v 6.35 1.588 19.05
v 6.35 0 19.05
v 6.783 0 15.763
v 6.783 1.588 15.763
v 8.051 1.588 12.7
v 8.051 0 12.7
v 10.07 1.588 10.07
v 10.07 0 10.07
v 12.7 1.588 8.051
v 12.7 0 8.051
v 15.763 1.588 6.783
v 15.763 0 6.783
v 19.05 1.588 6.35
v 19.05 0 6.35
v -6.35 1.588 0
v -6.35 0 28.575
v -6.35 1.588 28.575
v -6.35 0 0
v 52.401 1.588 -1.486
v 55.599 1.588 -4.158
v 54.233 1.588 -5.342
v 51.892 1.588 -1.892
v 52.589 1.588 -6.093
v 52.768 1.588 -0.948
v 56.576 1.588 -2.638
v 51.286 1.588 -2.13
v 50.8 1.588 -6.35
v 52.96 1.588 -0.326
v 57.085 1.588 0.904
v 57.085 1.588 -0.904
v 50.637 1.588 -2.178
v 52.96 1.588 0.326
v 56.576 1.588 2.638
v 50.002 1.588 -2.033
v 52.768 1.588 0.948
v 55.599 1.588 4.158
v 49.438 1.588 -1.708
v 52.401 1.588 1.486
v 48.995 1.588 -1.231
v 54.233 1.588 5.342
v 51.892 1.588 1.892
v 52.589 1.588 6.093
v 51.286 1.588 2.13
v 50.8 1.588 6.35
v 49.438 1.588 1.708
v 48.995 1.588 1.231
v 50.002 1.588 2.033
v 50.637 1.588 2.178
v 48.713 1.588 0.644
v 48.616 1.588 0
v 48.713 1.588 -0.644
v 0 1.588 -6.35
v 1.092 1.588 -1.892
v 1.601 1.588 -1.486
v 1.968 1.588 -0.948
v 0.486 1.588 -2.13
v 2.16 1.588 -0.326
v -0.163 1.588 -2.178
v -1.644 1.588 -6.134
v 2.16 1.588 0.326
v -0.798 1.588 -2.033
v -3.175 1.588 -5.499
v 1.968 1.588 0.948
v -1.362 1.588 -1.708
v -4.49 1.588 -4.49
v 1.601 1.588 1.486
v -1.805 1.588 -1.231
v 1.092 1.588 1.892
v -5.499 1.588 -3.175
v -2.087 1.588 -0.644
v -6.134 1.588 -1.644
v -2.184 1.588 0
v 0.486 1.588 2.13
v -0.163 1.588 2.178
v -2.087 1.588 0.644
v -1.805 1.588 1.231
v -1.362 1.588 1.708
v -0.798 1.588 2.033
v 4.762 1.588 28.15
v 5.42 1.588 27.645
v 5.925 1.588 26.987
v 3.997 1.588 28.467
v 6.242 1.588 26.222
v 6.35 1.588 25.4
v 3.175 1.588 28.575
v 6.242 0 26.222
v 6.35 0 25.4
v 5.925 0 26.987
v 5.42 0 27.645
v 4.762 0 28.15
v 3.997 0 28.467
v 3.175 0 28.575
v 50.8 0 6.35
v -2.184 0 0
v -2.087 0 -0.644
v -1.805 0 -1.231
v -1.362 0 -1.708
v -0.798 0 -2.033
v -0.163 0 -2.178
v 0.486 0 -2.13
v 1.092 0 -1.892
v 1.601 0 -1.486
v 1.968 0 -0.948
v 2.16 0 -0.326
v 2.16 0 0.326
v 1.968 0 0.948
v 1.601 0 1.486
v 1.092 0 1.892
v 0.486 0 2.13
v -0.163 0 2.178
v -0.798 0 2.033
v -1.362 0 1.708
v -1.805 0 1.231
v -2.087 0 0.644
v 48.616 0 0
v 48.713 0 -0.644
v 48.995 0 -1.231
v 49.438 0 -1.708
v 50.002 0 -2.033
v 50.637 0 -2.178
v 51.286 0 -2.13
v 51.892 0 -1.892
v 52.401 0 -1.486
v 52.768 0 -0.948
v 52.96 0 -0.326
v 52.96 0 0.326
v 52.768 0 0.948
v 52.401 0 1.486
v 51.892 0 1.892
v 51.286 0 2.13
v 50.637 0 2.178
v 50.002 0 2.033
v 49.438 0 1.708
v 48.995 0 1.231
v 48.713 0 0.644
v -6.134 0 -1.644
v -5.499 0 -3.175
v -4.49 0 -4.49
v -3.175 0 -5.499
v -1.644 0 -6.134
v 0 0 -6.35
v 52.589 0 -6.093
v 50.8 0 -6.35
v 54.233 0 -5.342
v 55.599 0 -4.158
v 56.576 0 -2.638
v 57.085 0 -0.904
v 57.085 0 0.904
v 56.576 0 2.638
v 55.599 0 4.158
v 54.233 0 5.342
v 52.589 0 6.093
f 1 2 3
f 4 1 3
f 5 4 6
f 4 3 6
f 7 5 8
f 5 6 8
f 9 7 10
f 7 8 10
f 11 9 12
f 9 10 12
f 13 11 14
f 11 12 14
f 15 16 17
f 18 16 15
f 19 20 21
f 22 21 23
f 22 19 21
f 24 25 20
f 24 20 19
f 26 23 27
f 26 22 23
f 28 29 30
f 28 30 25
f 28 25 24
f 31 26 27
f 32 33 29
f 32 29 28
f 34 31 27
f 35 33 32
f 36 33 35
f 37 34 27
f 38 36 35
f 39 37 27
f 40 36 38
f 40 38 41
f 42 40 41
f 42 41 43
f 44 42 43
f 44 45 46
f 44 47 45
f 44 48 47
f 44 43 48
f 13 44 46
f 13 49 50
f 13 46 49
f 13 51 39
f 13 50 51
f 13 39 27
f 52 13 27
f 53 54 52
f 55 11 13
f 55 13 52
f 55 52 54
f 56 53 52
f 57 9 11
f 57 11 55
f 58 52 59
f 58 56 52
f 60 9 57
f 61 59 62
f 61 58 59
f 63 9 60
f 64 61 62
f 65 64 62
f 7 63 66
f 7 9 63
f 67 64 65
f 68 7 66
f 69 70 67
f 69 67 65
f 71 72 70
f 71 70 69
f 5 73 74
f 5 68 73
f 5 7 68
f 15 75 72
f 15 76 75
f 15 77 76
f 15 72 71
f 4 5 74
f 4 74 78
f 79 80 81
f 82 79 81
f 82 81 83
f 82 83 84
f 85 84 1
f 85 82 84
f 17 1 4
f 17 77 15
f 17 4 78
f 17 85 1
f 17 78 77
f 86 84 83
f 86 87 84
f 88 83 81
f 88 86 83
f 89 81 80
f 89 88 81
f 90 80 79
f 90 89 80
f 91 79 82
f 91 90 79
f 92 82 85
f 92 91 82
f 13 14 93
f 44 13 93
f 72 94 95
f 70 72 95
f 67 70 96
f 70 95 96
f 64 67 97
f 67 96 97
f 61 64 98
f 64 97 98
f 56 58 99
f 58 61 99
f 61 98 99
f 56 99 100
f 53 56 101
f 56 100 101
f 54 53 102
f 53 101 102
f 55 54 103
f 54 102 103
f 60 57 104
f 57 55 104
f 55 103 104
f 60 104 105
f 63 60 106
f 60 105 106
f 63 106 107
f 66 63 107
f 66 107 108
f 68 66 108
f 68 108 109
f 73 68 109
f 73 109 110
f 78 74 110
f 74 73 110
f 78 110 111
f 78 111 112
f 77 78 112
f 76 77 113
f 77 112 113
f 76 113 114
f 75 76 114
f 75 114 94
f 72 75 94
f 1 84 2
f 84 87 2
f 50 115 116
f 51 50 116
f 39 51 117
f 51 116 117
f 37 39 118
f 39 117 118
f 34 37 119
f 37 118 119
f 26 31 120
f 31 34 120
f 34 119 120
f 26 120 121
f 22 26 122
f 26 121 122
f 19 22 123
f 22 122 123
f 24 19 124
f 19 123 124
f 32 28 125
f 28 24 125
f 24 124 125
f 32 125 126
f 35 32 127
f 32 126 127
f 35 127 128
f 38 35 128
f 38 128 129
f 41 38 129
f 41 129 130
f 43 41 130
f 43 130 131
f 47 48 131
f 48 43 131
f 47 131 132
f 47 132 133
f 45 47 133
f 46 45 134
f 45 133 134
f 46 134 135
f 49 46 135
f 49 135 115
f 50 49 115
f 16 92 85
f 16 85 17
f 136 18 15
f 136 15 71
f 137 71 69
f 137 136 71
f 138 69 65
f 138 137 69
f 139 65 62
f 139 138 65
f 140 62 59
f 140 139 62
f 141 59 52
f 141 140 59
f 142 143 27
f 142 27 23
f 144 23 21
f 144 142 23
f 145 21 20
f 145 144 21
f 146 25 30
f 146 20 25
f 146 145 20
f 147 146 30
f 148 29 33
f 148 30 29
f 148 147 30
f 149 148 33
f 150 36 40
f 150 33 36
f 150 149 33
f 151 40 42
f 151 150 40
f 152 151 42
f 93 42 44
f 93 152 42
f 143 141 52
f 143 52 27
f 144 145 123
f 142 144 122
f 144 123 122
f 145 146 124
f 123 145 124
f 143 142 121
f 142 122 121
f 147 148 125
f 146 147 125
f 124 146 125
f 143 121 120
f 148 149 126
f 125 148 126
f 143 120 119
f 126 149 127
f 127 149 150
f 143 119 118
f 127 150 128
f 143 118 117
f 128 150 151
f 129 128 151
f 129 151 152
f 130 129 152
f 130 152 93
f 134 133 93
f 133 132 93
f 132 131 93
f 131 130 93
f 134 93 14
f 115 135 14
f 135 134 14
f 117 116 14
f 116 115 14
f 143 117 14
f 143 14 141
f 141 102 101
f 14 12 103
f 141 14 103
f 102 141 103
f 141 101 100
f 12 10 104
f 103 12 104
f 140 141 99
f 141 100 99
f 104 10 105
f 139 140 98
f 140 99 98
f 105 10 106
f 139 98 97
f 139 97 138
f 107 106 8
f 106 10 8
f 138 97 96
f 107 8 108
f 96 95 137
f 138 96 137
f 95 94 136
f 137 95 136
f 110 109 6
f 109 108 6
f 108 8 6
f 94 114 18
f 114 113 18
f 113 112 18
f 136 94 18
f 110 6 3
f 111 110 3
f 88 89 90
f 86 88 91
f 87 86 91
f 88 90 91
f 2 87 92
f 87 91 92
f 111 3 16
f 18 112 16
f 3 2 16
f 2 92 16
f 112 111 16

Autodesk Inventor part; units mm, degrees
ref_plane "YZ Plane" through (0, 0, 0) normal (1, 0, 0) x (0, 1, 0)
ref_plane "XZ Plane" through (0, 0, 0) normal (0, 1, 0) x (-1, 0, 0)
ref_plane "XY Plane" through (0, 0, 0) normal (0, 0, 1) x (1, 0, 0)
sketch "main" plane through (0, 0, 0) normal (0, 0, 1) x (1, 0, 0)
  circle A0 centre (13.5257, -15.1463) radius 2.1844
  circle A1 centre (-37.2743, -15.1463) radius 2.1844
  arc A2 (13.5257, -21.4963) -> (19.8757, -15.1463) centre (13.5257, -15.1463) ccw
  arc A3 (-37.2743, -8.7963) -> (-37.2743, -21.4963) centre (-37.2743, -15.1463) ccw
  line L0 (7.1757, 10.2537) -> (7.1757, 3.9037)
  line L1 (-5.5243, -8.7963) -> (-37.2743, -8.7963)
  arc A4 (-5.5243, -8.7963) -> (7.1757, 3.9037) centre (-5.5243, 3.9037) ccw
  line L2 (19.8757, 13.4287) -> (19.8757, -15.1463)
  line L3 (13.5257, -21.4963) -> (-37.2743, -21.4963)
  line L4 (10.3507, 13.4287) -> (19.8757, 13.4287)
  arc A5 (10.3507, 13.4287) -> (7.1757, 10.2537) centre (10.3507, 10.2537) ccw
  point P0 (6.3402, -4.1174)
  dimension "d0" = 12.7
  dimension "d1" = 12.7
  dimension "d2" = 12.7
  dimension "d5" = 50.8
  dimension "d7" = 34.925
  dimension "d8" = 3.175
sketch "Sketch1" plane through (0, 0, 0) normal (0, 1, 0) x (-1, 0, 0)
  circle A0 centre (0, 0) radius 2.1844
  circle A1 centre (-50.8, 0) radius 2.1844
  arc A2 (0, -6.35) -> (6.35, 0) centre (0, 0) ccw
  arc A3 (-50.8, 6.35) -> (-50.8, -6.35) centre (-50.8, 0) ccw
  line L0 (-6.35, 25.4) -> (-6.35, 19.05)
  line L1 (-19.05, 6.35) -> (-50.8, 6.35)
  arc A4 (-19.05, 6.35) -> (-6.35, 19.05) centre (-19.05, 19.05) ccw
  line L2 (6.35, 28.575) -> (6.35, 0)
  line L3 (0, -6.35) -> (-50.8, -6.35)
  line L4 (-3.175, 28.575) -> (6.35, 28.575)
  arc A5 (-3.175, 28.575) -> (-6.35, 25.4) centre (-3.175, 25.4) ccw
extrude "Extrusion1" add sketch "Sketch1" along normal blind 1.5875
properties part number "Magazine Gusset"
